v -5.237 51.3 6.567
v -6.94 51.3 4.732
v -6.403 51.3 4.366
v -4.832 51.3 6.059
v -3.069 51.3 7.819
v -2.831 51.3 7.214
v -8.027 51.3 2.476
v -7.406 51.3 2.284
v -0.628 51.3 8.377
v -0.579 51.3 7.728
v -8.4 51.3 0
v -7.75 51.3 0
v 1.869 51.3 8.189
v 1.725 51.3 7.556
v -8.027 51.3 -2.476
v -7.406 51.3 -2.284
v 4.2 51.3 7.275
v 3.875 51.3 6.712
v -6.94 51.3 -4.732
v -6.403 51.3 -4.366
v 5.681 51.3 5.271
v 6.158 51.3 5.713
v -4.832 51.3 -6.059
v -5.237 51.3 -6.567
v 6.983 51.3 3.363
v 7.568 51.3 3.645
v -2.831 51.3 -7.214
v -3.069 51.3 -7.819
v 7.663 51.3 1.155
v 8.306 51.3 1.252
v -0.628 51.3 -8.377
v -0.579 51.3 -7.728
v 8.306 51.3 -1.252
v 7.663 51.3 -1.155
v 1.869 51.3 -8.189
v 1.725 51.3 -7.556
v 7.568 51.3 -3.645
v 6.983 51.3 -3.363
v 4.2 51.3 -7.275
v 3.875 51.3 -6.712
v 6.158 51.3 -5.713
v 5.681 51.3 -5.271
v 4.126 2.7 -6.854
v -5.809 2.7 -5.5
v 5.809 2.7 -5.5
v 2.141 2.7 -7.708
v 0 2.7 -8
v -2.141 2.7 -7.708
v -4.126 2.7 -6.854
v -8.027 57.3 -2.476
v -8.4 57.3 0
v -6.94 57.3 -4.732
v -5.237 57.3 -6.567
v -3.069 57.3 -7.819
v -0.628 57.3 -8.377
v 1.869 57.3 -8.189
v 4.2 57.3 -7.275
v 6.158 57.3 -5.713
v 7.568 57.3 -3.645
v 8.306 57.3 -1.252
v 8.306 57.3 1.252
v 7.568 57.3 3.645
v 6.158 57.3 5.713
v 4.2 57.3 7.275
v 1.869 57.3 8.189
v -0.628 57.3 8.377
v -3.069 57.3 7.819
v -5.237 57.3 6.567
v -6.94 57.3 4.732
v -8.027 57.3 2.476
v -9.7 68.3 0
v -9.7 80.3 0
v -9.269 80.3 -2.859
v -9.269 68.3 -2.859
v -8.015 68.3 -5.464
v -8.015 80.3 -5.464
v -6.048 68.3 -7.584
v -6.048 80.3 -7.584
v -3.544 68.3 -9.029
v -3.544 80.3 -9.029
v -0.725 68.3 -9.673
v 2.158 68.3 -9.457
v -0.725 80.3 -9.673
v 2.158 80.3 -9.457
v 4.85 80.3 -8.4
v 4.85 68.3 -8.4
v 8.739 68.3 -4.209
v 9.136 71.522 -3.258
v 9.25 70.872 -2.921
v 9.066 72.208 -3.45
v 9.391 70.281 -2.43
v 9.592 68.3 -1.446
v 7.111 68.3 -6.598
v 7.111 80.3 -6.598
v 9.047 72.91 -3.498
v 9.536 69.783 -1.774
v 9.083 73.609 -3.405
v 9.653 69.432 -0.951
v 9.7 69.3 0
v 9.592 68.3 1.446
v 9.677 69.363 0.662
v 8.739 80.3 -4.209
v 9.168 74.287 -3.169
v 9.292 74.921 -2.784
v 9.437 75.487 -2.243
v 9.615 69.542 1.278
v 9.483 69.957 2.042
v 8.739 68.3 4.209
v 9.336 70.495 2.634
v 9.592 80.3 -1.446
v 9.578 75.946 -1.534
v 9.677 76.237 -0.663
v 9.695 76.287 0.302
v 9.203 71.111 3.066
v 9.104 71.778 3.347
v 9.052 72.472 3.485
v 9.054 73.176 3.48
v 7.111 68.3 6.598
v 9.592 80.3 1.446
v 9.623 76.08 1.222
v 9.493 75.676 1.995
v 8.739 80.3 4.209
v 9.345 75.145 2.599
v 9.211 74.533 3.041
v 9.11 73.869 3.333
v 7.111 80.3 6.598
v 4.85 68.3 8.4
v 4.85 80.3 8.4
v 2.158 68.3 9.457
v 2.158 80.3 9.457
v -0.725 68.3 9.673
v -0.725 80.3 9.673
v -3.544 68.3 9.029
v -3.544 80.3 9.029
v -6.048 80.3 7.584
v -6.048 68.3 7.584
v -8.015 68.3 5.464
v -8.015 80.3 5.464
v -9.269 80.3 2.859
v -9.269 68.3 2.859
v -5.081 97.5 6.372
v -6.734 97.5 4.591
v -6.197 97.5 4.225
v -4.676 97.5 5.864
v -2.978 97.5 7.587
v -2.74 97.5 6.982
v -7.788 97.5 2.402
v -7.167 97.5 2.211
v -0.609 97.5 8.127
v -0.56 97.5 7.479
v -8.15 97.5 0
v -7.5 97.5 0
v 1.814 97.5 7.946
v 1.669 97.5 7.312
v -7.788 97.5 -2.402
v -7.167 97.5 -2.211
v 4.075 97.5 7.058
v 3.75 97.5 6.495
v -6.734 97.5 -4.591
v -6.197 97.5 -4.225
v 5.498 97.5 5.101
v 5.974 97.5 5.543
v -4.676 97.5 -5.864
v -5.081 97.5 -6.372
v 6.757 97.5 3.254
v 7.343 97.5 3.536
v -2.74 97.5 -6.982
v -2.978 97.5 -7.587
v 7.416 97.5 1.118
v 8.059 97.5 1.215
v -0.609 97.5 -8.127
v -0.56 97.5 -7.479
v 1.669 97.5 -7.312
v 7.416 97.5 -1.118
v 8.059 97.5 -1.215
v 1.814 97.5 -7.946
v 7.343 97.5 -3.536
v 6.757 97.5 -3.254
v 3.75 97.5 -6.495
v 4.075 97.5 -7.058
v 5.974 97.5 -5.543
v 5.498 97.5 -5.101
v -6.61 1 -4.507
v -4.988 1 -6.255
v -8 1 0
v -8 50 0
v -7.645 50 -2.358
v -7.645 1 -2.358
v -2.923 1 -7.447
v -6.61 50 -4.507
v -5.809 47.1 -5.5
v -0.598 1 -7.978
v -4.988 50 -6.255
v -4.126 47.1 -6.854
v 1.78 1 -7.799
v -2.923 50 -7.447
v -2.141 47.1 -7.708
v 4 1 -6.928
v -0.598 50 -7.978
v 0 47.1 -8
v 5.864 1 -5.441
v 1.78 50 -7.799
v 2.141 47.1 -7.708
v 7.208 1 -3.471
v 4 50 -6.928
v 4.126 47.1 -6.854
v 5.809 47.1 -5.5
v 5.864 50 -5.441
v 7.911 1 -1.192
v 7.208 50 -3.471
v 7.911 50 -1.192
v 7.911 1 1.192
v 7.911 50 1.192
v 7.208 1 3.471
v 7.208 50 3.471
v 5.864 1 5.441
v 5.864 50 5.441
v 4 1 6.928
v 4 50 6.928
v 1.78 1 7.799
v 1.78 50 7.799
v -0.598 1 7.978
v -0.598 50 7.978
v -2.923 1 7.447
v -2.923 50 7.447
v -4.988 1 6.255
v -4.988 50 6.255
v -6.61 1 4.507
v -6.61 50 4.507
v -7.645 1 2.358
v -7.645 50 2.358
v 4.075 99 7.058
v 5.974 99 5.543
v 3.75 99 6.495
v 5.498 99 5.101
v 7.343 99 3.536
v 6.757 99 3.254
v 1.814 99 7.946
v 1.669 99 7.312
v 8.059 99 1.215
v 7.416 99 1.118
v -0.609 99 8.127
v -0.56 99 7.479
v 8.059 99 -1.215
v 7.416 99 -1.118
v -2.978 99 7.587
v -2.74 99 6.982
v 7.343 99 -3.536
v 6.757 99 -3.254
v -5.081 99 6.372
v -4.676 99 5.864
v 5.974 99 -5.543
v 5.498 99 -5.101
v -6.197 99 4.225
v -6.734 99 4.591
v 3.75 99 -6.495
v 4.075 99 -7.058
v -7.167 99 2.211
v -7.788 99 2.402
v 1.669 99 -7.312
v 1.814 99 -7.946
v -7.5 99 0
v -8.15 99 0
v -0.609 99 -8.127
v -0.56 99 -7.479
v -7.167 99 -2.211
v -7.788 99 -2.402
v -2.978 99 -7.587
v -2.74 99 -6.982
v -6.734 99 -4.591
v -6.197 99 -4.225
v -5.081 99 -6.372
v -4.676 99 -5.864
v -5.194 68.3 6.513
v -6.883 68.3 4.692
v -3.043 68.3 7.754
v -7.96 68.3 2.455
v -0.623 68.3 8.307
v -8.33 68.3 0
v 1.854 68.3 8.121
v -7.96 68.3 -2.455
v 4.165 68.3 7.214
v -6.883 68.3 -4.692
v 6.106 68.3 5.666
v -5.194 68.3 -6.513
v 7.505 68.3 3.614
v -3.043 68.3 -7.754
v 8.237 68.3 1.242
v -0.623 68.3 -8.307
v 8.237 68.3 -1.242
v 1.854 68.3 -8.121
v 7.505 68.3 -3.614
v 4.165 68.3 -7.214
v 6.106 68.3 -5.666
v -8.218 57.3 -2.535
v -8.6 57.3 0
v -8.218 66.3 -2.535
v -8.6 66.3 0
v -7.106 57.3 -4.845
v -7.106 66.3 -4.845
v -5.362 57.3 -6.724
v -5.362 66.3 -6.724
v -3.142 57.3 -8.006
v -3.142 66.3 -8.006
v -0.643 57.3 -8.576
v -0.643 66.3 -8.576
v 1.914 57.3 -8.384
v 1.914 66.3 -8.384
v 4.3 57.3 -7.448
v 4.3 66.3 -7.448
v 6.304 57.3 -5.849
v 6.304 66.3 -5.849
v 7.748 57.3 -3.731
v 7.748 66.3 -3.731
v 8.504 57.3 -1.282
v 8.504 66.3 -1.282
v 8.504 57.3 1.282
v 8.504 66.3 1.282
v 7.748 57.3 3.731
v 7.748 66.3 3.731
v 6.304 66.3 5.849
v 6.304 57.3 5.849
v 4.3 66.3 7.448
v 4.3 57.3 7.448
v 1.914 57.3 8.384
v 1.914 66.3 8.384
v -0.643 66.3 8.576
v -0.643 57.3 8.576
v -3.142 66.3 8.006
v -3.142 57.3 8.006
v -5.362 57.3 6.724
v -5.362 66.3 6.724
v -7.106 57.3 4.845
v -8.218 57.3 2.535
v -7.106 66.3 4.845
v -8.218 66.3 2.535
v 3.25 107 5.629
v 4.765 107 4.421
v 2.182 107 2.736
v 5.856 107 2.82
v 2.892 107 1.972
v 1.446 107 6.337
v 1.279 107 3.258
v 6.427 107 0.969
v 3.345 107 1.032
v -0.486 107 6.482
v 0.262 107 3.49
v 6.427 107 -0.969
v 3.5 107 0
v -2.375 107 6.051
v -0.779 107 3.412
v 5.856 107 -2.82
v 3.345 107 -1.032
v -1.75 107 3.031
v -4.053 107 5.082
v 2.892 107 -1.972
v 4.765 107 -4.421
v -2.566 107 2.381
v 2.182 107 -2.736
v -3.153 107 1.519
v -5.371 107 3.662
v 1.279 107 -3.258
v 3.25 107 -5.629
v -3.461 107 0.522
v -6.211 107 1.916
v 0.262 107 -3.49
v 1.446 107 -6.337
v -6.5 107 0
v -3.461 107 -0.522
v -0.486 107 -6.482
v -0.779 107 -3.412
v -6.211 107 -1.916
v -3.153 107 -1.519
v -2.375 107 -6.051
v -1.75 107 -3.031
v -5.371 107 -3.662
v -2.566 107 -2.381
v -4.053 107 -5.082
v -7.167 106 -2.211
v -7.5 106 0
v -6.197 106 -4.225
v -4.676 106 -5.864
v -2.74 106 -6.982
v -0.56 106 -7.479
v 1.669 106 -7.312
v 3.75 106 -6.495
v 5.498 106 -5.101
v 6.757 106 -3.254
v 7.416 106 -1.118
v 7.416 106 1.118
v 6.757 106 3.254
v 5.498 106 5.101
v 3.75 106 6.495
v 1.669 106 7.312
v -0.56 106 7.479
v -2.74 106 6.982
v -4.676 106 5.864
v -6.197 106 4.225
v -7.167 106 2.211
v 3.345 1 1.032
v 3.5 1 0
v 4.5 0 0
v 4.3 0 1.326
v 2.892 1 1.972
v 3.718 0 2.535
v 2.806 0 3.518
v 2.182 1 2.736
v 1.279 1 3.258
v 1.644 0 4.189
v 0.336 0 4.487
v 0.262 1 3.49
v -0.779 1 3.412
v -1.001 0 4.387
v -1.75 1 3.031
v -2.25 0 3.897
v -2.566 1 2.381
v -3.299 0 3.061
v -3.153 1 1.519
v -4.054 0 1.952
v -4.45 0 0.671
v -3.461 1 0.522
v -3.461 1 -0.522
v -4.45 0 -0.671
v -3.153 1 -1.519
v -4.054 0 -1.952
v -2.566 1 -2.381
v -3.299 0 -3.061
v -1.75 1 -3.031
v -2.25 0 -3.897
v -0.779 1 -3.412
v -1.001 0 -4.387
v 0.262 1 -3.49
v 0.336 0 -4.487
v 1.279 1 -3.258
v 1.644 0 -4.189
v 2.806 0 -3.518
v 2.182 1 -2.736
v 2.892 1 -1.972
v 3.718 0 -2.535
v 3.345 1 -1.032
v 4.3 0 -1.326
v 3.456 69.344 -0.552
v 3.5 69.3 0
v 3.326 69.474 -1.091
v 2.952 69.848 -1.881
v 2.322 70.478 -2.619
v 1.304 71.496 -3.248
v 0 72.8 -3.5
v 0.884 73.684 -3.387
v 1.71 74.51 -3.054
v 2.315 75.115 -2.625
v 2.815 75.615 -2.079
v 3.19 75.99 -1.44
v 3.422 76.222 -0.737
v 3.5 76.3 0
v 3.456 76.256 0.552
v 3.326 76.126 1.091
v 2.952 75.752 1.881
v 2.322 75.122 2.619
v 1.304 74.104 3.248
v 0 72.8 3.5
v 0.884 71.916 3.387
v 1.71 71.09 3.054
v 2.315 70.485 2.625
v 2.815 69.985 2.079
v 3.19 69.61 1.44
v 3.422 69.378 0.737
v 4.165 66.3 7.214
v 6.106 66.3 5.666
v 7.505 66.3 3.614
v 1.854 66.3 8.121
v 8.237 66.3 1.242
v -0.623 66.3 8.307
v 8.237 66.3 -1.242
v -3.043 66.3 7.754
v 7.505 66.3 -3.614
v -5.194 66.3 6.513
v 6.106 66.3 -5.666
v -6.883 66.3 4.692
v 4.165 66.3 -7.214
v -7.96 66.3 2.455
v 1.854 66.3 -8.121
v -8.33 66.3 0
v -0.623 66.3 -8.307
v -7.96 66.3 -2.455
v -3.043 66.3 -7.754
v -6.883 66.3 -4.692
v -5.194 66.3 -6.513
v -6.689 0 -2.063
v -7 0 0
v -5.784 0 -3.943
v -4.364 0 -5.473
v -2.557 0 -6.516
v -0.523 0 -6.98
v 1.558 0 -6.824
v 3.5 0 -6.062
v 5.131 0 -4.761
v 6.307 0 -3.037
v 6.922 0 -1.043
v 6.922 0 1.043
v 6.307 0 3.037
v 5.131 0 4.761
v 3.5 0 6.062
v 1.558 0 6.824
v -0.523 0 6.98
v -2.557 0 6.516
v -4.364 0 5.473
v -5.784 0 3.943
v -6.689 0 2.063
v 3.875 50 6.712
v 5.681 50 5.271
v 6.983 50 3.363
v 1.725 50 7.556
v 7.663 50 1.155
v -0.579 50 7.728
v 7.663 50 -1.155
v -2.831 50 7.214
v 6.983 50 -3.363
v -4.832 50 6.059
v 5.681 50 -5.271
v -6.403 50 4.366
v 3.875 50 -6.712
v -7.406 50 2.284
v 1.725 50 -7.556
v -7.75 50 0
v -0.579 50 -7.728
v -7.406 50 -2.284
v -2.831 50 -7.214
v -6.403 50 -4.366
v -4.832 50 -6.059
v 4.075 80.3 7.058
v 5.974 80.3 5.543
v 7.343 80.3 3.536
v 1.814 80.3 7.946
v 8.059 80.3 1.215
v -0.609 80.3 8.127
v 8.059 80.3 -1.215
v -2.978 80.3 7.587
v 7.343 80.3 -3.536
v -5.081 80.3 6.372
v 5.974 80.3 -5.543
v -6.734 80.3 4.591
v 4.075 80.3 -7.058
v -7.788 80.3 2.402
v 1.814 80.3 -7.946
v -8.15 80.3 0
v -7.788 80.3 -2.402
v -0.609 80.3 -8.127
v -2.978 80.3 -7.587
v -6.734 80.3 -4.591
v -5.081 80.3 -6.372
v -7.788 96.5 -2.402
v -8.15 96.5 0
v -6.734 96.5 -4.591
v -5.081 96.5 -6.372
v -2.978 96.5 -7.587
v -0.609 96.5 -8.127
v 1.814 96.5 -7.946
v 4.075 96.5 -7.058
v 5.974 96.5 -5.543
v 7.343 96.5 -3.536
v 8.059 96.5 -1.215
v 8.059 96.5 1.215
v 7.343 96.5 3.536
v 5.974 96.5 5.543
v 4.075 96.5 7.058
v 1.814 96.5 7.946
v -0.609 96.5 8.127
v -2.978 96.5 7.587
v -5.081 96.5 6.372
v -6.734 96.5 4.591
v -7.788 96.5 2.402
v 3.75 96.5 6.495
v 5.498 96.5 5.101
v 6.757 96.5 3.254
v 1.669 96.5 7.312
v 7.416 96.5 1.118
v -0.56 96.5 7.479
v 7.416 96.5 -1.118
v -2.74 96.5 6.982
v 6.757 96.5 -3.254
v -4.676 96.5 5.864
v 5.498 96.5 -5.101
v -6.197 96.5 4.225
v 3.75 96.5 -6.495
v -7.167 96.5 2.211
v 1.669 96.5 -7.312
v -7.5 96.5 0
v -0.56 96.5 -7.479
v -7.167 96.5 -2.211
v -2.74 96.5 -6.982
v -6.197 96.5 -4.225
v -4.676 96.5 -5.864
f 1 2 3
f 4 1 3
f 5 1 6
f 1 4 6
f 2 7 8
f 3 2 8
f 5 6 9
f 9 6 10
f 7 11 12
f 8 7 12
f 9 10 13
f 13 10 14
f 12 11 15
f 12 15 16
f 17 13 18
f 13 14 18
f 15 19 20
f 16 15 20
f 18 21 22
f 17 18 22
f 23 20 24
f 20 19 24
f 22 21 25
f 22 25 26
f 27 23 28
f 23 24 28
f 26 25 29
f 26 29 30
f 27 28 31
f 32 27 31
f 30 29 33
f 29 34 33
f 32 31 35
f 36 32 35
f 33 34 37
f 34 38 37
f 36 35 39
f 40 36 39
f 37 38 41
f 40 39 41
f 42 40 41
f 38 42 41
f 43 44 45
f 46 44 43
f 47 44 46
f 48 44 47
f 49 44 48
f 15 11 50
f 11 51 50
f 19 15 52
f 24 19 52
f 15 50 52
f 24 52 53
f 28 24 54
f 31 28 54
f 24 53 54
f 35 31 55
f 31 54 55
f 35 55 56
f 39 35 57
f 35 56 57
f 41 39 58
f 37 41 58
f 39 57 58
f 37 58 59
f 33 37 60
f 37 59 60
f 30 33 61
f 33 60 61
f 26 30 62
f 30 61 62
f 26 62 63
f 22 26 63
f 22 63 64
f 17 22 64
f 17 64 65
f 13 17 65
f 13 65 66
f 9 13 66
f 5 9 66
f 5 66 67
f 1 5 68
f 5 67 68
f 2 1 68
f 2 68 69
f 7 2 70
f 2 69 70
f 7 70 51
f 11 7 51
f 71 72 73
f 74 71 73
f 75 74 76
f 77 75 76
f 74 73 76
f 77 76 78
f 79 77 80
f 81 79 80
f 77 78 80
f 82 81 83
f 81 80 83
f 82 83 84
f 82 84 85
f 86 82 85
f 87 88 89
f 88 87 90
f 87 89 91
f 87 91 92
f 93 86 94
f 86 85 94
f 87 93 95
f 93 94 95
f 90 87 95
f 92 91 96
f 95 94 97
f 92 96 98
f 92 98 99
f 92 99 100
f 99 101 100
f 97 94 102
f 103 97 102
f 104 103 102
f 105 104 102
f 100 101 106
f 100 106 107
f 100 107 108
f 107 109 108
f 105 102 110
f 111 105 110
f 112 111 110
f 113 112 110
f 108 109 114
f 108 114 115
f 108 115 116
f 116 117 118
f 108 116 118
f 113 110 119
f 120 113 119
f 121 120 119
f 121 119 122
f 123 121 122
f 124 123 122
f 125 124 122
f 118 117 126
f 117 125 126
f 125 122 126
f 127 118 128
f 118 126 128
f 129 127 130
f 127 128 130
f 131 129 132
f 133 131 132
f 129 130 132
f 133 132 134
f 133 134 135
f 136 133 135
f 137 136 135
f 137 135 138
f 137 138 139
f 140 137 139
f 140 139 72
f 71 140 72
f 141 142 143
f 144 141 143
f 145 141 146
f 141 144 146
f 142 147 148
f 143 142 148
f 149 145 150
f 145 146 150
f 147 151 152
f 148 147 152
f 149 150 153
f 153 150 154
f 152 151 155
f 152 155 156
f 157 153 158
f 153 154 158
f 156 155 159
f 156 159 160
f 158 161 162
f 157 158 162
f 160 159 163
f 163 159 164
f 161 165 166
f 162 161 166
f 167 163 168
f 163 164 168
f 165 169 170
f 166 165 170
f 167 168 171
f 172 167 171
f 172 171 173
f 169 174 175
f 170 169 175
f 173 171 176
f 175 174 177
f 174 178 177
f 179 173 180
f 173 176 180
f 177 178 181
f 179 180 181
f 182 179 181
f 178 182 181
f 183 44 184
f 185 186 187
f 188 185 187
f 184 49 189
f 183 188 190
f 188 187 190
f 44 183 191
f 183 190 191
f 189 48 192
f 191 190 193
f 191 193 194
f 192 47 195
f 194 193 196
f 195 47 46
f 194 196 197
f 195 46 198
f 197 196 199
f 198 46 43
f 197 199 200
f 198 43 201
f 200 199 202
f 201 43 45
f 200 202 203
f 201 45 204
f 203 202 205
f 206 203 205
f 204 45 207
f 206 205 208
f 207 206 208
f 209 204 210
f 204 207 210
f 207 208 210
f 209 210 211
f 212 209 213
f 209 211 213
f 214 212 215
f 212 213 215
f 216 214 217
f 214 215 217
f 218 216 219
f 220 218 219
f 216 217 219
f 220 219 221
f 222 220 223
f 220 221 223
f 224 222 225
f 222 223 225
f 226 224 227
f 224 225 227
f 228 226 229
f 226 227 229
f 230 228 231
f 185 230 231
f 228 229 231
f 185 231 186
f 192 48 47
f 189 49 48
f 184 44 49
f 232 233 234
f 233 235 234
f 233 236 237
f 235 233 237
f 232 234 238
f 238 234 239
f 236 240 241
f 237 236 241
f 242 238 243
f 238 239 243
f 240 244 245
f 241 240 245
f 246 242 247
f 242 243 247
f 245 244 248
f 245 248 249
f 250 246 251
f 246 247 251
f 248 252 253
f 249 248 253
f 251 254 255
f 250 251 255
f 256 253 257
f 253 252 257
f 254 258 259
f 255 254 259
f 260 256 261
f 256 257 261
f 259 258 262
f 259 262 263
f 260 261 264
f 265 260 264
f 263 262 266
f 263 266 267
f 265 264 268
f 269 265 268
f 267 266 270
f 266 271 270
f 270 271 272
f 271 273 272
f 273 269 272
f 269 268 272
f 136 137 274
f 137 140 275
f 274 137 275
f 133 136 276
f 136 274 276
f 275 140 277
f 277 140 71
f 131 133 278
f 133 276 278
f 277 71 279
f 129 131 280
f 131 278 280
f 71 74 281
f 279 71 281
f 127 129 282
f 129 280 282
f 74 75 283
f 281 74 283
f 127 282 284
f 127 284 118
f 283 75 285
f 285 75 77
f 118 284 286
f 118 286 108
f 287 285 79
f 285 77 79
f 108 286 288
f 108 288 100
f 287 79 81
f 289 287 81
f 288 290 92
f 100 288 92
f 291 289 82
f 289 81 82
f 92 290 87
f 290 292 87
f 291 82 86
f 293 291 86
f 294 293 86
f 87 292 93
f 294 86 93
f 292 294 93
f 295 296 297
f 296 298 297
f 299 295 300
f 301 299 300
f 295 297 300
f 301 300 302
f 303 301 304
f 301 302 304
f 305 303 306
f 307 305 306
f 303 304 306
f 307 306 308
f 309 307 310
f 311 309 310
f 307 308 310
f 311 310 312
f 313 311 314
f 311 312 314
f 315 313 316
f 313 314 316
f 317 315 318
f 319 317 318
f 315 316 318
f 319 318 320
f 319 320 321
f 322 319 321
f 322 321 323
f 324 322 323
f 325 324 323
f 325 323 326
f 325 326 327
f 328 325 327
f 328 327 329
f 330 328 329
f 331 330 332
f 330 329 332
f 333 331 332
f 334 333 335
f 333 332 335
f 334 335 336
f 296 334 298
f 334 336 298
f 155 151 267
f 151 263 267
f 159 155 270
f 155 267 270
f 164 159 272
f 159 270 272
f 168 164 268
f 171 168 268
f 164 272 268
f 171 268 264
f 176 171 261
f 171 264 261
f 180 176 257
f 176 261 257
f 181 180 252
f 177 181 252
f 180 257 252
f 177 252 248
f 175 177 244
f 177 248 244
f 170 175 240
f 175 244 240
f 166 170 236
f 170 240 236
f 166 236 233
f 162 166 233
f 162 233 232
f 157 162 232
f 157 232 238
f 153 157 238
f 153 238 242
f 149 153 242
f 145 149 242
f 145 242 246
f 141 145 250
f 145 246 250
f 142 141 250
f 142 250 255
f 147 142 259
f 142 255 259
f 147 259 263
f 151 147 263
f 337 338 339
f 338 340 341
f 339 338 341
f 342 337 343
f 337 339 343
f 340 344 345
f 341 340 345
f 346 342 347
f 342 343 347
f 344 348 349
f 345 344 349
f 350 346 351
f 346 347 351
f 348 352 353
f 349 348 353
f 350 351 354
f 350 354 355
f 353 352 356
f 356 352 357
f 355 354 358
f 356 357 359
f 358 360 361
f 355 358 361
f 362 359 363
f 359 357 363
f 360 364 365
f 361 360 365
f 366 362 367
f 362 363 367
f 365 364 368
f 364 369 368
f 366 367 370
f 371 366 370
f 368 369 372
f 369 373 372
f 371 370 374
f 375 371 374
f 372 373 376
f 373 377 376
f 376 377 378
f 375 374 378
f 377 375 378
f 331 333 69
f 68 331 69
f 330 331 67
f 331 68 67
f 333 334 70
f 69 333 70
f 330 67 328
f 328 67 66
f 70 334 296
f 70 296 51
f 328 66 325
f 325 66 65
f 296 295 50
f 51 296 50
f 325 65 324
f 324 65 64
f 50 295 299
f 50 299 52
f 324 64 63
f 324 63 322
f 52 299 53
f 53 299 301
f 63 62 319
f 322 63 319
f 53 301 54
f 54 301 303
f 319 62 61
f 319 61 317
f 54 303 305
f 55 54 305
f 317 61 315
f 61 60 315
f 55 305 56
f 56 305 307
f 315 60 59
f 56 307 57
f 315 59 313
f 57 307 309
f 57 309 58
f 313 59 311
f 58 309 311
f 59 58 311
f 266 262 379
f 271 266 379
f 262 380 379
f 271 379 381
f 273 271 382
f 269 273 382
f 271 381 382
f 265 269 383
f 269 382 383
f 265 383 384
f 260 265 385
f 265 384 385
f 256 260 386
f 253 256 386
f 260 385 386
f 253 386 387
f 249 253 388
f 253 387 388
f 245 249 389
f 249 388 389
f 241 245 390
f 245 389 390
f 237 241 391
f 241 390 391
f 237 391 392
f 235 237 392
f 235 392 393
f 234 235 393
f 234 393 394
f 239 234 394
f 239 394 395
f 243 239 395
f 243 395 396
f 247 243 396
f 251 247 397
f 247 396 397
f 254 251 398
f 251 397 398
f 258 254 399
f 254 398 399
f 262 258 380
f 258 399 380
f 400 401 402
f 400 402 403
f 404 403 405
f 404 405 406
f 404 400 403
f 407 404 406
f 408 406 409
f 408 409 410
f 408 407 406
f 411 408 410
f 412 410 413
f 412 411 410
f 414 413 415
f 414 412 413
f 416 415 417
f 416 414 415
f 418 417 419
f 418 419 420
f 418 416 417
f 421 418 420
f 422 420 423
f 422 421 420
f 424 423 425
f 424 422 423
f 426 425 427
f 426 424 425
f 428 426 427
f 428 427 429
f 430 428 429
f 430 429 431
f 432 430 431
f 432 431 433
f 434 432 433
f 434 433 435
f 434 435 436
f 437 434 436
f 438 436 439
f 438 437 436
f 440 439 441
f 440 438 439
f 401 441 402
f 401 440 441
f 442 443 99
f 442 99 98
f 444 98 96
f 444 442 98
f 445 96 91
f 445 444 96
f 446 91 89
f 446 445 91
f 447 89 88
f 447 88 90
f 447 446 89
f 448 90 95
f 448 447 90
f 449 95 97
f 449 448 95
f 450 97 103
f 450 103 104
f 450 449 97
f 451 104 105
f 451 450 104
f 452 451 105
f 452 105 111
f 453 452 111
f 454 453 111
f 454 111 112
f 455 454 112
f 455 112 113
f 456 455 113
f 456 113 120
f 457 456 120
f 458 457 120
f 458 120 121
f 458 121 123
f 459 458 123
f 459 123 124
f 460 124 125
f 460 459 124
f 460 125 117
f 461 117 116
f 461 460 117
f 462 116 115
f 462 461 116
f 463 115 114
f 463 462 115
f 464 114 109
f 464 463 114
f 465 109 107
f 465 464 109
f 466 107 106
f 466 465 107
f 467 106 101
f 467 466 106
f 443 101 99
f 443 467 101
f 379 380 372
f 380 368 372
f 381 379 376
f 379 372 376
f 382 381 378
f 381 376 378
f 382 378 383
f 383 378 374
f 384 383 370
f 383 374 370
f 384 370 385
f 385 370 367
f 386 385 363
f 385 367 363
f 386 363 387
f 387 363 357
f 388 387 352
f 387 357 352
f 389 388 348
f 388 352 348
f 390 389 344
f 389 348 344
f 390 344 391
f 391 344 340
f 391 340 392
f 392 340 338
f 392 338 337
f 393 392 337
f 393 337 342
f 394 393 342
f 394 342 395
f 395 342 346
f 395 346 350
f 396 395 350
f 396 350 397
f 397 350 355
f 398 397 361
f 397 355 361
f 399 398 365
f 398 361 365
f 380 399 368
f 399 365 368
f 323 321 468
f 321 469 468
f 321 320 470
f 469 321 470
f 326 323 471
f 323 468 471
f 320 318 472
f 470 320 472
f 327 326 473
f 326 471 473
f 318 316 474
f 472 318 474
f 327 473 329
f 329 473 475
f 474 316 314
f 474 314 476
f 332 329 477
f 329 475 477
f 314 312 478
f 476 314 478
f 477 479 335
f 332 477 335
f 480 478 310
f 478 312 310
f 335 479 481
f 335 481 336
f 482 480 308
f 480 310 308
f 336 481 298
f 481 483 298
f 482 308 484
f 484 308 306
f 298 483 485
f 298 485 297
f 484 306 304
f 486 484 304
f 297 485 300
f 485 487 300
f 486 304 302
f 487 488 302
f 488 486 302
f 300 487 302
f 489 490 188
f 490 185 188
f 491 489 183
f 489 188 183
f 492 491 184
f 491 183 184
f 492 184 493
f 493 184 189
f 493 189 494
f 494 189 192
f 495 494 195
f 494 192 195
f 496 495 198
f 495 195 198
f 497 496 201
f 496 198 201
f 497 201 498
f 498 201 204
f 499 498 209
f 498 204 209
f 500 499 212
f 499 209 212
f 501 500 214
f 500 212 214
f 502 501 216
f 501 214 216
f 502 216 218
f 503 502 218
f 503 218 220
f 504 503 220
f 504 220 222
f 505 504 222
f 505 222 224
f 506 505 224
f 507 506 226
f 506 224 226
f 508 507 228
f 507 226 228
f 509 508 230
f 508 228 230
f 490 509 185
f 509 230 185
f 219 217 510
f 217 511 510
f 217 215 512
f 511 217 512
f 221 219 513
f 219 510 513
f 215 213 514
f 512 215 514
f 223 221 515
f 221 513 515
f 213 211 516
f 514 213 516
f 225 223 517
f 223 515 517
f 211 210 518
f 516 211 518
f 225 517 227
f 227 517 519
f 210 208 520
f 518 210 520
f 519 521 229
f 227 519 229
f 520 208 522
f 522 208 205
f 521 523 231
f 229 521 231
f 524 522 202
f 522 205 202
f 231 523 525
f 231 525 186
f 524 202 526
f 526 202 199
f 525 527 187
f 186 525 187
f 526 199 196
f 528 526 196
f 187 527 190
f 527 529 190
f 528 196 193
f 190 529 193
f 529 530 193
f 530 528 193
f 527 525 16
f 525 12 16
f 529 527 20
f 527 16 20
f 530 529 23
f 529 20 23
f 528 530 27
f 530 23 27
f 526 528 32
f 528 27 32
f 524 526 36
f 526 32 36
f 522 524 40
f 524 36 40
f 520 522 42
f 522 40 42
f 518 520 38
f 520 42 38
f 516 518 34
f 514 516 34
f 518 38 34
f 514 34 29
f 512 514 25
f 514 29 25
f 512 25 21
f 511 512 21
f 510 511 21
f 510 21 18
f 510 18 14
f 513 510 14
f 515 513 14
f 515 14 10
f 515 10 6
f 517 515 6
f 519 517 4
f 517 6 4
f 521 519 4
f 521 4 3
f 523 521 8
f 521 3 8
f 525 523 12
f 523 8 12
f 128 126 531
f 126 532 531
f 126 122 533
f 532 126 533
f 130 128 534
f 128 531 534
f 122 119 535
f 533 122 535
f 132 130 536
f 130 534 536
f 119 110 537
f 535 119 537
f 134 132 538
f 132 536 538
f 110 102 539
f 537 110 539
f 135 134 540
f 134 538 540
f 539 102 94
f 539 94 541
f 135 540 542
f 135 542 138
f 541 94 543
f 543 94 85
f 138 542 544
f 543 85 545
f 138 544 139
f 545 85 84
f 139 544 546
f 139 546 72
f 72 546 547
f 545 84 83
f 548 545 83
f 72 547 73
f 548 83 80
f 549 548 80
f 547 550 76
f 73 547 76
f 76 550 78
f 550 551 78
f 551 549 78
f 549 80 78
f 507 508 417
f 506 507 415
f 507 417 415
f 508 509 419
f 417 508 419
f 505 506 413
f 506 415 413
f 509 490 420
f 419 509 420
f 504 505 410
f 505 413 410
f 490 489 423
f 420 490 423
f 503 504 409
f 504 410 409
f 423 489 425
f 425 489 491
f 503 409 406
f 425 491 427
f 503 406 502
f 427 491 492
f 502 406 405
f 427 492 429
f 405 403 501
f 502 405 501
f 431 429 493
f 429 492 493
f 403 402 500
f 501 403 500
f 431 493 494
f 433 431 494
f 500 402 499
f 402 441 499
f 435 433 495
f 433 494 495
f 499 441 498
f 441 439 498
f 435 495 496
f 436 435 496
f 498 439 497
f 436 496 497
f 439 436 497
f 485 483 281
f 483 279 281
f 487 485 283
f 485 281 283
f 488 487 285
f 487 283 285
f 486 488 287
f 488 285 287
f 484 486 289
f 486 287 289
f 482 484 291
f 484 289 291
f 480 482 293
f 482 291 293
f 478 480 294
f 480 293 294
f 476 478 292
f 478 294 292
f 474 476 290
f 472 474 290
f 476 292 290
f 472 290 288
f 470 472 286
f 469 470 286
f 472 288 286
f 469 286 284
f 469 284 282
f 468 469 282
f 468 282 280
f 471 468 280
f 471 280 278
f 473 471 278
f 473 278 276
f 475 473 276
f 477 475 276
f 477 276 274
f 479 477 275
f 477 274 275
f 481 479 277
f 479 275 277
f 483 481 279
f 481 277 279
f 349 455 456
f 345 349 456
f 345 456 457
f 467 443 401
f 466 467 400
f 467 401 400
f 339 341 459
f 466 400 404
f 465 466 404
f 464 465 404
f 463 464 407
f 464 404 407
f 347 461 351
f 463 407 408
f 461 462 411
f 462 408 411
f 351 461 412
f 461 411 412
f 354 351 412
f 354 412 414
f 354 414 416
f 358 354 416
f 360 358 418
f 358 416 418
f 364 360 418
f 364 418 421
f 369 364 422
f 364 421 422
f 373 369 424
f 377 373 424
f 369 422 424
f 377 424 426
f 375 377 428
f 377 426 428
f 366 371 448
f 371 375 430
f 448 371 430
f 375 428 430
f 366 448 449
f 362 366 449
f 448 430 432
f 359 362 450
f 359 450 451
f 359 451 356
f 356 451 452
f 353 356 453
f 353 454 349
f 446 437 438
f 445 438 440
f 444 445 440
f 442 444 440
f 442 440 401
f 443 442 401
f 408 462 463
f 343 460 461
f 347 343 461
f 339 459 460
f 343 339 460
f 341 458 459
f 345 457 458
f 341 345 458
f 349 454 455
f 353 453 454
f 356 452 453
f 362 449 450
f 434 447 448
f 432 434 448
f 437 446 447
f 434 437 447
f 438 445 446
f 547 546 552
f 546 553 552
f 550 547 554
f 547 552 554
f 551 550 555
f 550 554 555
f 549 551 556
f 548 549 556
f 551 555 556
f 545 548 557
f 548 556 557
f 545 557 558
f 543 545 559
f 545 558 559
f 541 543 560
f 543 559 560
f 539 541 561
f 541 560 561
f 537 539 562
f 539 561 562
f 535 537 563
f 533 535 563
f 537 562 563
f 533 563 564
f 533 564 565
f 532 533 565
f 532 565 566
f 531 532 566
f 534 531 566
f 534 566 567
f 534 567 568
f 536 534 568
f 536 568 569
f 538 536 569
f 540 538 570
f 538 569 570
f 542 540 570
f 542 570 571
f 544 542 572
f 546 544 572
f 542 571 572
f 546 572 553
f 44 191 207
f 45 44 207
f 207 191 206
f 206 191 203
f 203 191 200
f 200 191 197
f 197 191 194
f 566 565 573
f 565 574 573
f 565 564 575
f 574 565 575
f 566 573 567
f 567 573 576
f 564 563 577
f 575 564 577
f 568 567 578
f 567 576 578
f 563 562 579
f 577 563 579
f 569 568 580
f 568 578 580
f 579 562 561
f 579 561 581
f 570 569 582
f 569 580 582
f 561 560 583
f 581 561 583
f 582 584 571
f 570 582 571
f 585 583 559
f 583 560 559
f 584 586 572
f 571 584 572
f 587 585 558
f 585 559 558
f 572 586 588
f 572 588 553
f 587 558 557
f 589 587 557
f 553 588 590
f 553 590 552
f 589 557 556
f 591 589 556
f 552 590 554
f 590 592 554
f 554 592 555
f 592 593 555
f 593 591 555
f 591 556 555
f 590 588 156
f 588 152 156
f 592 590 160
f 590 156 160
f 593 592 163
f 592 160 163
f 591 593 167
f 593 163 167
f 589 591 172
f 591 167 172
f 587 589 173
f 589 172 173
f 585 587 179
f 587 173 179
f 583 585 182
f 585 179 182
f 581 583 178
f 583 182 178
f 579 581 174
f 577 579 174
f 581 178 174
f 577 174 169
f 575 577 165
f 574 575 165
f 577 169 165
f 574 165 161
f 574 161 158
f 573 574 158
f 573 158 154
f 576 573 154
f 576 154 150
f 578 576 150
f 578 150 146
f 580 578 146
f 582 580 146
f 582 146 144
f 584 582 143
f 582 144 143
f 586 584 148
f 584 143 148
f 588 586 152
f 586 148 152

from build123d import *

# Parameters (mm, degrees)
ENL_V_START             = -5.5
ESQUISSE2_W             = 11.618950038
ESQUISSE2_H             = 44.4
ENL_V_MAT_EXTRU_1_DEPTH = 5.2
ENL_V_MAT_EXTRU_2_DEPTH = 10.7
ESQUISSE6_R             = 3.5
ENL_V_MAT_EXTRU_3_DEPTH = 120
CHANFREIN1_SIZE         = 1


with BuildPart() as part:
    # Esquisse1 → Révolution1 (revolve)
    with BuildSketch(Plane.XY):
        Polygon((0, 0), (-7, 0), (-8, 1), (-8, 50), (-7.75, 50), (-7.75, 51.3), (-8.4, 51.3), (-8.4, 57.3), (-8.6, 57.3), (-8.6, 66.3), (-8.33, 66.3), (-8.33, 68.3), (-9.7, 68.3), (-9.7, 80.3), (-8.15, 80.3), (-8.15, 96.5), (-7.5, 96.5), (-7.5, 97.5), (-8.15, 97.5), (-8.15, 99), (-7.5, 99), (-7.5, 106), (-6.5, 107), (0, 107), align=None)
    revolve(axis=Axis((0, 107, 0), (0, -1, 0)))

    # Esquisse2 → Enlèv. mat.-Extru.1 (cut, through all)
    with BuildSketch(Plane.XY.offset(ENL_V_START)):
        with Locations((0, 24.9)):
            Rectangle(ESQUISSE2_W, ESQUISSE2_H)
    extrude(amount=-ENL_V_MAT_EXTRU_1_DEPTH, mode=Mode.SUBTRACT)

    # Esquisse5 → Enlèv. mat.-Extru.2 (cut, through all)
    with BuildSketch(Plane(origin=(0, 0, 0), x_dir=(0, 0, -1), z_dir=(1, 0, 0))):
        with BuildLine():
            ThreePointArc((0, 76.3), (-3.5, 72.8), (0, 69.3))
            ThreePointArc((0, 69.3), (3.5, 72.8), (0, 76.3))
        make_face()
    extrude(amount=ENL_V_MAT_EXTRU_2_DEPTH, mode=Mode.SUBTRACT)

    # Esquisse6 → Enlèv. mat.-Extru.3 (cut)
    with BuildSketch(Plane.XZ):
        Circle(ESQUISSE6_R)
    extrude(amount=-ENL_V_MAT_EXTRU_3_DEPTH, mode=Mode.SUBTRACT)

    # Chanfrein1
    chanfrein1_edges = [part.edges().sort_by_distance(p)[0] for p in [
        (-3.5, 0, 0),
    ]]
    chamfer(chanfrein1_edges, length=CHANFREIN1_SIZE)


solid = part.part
